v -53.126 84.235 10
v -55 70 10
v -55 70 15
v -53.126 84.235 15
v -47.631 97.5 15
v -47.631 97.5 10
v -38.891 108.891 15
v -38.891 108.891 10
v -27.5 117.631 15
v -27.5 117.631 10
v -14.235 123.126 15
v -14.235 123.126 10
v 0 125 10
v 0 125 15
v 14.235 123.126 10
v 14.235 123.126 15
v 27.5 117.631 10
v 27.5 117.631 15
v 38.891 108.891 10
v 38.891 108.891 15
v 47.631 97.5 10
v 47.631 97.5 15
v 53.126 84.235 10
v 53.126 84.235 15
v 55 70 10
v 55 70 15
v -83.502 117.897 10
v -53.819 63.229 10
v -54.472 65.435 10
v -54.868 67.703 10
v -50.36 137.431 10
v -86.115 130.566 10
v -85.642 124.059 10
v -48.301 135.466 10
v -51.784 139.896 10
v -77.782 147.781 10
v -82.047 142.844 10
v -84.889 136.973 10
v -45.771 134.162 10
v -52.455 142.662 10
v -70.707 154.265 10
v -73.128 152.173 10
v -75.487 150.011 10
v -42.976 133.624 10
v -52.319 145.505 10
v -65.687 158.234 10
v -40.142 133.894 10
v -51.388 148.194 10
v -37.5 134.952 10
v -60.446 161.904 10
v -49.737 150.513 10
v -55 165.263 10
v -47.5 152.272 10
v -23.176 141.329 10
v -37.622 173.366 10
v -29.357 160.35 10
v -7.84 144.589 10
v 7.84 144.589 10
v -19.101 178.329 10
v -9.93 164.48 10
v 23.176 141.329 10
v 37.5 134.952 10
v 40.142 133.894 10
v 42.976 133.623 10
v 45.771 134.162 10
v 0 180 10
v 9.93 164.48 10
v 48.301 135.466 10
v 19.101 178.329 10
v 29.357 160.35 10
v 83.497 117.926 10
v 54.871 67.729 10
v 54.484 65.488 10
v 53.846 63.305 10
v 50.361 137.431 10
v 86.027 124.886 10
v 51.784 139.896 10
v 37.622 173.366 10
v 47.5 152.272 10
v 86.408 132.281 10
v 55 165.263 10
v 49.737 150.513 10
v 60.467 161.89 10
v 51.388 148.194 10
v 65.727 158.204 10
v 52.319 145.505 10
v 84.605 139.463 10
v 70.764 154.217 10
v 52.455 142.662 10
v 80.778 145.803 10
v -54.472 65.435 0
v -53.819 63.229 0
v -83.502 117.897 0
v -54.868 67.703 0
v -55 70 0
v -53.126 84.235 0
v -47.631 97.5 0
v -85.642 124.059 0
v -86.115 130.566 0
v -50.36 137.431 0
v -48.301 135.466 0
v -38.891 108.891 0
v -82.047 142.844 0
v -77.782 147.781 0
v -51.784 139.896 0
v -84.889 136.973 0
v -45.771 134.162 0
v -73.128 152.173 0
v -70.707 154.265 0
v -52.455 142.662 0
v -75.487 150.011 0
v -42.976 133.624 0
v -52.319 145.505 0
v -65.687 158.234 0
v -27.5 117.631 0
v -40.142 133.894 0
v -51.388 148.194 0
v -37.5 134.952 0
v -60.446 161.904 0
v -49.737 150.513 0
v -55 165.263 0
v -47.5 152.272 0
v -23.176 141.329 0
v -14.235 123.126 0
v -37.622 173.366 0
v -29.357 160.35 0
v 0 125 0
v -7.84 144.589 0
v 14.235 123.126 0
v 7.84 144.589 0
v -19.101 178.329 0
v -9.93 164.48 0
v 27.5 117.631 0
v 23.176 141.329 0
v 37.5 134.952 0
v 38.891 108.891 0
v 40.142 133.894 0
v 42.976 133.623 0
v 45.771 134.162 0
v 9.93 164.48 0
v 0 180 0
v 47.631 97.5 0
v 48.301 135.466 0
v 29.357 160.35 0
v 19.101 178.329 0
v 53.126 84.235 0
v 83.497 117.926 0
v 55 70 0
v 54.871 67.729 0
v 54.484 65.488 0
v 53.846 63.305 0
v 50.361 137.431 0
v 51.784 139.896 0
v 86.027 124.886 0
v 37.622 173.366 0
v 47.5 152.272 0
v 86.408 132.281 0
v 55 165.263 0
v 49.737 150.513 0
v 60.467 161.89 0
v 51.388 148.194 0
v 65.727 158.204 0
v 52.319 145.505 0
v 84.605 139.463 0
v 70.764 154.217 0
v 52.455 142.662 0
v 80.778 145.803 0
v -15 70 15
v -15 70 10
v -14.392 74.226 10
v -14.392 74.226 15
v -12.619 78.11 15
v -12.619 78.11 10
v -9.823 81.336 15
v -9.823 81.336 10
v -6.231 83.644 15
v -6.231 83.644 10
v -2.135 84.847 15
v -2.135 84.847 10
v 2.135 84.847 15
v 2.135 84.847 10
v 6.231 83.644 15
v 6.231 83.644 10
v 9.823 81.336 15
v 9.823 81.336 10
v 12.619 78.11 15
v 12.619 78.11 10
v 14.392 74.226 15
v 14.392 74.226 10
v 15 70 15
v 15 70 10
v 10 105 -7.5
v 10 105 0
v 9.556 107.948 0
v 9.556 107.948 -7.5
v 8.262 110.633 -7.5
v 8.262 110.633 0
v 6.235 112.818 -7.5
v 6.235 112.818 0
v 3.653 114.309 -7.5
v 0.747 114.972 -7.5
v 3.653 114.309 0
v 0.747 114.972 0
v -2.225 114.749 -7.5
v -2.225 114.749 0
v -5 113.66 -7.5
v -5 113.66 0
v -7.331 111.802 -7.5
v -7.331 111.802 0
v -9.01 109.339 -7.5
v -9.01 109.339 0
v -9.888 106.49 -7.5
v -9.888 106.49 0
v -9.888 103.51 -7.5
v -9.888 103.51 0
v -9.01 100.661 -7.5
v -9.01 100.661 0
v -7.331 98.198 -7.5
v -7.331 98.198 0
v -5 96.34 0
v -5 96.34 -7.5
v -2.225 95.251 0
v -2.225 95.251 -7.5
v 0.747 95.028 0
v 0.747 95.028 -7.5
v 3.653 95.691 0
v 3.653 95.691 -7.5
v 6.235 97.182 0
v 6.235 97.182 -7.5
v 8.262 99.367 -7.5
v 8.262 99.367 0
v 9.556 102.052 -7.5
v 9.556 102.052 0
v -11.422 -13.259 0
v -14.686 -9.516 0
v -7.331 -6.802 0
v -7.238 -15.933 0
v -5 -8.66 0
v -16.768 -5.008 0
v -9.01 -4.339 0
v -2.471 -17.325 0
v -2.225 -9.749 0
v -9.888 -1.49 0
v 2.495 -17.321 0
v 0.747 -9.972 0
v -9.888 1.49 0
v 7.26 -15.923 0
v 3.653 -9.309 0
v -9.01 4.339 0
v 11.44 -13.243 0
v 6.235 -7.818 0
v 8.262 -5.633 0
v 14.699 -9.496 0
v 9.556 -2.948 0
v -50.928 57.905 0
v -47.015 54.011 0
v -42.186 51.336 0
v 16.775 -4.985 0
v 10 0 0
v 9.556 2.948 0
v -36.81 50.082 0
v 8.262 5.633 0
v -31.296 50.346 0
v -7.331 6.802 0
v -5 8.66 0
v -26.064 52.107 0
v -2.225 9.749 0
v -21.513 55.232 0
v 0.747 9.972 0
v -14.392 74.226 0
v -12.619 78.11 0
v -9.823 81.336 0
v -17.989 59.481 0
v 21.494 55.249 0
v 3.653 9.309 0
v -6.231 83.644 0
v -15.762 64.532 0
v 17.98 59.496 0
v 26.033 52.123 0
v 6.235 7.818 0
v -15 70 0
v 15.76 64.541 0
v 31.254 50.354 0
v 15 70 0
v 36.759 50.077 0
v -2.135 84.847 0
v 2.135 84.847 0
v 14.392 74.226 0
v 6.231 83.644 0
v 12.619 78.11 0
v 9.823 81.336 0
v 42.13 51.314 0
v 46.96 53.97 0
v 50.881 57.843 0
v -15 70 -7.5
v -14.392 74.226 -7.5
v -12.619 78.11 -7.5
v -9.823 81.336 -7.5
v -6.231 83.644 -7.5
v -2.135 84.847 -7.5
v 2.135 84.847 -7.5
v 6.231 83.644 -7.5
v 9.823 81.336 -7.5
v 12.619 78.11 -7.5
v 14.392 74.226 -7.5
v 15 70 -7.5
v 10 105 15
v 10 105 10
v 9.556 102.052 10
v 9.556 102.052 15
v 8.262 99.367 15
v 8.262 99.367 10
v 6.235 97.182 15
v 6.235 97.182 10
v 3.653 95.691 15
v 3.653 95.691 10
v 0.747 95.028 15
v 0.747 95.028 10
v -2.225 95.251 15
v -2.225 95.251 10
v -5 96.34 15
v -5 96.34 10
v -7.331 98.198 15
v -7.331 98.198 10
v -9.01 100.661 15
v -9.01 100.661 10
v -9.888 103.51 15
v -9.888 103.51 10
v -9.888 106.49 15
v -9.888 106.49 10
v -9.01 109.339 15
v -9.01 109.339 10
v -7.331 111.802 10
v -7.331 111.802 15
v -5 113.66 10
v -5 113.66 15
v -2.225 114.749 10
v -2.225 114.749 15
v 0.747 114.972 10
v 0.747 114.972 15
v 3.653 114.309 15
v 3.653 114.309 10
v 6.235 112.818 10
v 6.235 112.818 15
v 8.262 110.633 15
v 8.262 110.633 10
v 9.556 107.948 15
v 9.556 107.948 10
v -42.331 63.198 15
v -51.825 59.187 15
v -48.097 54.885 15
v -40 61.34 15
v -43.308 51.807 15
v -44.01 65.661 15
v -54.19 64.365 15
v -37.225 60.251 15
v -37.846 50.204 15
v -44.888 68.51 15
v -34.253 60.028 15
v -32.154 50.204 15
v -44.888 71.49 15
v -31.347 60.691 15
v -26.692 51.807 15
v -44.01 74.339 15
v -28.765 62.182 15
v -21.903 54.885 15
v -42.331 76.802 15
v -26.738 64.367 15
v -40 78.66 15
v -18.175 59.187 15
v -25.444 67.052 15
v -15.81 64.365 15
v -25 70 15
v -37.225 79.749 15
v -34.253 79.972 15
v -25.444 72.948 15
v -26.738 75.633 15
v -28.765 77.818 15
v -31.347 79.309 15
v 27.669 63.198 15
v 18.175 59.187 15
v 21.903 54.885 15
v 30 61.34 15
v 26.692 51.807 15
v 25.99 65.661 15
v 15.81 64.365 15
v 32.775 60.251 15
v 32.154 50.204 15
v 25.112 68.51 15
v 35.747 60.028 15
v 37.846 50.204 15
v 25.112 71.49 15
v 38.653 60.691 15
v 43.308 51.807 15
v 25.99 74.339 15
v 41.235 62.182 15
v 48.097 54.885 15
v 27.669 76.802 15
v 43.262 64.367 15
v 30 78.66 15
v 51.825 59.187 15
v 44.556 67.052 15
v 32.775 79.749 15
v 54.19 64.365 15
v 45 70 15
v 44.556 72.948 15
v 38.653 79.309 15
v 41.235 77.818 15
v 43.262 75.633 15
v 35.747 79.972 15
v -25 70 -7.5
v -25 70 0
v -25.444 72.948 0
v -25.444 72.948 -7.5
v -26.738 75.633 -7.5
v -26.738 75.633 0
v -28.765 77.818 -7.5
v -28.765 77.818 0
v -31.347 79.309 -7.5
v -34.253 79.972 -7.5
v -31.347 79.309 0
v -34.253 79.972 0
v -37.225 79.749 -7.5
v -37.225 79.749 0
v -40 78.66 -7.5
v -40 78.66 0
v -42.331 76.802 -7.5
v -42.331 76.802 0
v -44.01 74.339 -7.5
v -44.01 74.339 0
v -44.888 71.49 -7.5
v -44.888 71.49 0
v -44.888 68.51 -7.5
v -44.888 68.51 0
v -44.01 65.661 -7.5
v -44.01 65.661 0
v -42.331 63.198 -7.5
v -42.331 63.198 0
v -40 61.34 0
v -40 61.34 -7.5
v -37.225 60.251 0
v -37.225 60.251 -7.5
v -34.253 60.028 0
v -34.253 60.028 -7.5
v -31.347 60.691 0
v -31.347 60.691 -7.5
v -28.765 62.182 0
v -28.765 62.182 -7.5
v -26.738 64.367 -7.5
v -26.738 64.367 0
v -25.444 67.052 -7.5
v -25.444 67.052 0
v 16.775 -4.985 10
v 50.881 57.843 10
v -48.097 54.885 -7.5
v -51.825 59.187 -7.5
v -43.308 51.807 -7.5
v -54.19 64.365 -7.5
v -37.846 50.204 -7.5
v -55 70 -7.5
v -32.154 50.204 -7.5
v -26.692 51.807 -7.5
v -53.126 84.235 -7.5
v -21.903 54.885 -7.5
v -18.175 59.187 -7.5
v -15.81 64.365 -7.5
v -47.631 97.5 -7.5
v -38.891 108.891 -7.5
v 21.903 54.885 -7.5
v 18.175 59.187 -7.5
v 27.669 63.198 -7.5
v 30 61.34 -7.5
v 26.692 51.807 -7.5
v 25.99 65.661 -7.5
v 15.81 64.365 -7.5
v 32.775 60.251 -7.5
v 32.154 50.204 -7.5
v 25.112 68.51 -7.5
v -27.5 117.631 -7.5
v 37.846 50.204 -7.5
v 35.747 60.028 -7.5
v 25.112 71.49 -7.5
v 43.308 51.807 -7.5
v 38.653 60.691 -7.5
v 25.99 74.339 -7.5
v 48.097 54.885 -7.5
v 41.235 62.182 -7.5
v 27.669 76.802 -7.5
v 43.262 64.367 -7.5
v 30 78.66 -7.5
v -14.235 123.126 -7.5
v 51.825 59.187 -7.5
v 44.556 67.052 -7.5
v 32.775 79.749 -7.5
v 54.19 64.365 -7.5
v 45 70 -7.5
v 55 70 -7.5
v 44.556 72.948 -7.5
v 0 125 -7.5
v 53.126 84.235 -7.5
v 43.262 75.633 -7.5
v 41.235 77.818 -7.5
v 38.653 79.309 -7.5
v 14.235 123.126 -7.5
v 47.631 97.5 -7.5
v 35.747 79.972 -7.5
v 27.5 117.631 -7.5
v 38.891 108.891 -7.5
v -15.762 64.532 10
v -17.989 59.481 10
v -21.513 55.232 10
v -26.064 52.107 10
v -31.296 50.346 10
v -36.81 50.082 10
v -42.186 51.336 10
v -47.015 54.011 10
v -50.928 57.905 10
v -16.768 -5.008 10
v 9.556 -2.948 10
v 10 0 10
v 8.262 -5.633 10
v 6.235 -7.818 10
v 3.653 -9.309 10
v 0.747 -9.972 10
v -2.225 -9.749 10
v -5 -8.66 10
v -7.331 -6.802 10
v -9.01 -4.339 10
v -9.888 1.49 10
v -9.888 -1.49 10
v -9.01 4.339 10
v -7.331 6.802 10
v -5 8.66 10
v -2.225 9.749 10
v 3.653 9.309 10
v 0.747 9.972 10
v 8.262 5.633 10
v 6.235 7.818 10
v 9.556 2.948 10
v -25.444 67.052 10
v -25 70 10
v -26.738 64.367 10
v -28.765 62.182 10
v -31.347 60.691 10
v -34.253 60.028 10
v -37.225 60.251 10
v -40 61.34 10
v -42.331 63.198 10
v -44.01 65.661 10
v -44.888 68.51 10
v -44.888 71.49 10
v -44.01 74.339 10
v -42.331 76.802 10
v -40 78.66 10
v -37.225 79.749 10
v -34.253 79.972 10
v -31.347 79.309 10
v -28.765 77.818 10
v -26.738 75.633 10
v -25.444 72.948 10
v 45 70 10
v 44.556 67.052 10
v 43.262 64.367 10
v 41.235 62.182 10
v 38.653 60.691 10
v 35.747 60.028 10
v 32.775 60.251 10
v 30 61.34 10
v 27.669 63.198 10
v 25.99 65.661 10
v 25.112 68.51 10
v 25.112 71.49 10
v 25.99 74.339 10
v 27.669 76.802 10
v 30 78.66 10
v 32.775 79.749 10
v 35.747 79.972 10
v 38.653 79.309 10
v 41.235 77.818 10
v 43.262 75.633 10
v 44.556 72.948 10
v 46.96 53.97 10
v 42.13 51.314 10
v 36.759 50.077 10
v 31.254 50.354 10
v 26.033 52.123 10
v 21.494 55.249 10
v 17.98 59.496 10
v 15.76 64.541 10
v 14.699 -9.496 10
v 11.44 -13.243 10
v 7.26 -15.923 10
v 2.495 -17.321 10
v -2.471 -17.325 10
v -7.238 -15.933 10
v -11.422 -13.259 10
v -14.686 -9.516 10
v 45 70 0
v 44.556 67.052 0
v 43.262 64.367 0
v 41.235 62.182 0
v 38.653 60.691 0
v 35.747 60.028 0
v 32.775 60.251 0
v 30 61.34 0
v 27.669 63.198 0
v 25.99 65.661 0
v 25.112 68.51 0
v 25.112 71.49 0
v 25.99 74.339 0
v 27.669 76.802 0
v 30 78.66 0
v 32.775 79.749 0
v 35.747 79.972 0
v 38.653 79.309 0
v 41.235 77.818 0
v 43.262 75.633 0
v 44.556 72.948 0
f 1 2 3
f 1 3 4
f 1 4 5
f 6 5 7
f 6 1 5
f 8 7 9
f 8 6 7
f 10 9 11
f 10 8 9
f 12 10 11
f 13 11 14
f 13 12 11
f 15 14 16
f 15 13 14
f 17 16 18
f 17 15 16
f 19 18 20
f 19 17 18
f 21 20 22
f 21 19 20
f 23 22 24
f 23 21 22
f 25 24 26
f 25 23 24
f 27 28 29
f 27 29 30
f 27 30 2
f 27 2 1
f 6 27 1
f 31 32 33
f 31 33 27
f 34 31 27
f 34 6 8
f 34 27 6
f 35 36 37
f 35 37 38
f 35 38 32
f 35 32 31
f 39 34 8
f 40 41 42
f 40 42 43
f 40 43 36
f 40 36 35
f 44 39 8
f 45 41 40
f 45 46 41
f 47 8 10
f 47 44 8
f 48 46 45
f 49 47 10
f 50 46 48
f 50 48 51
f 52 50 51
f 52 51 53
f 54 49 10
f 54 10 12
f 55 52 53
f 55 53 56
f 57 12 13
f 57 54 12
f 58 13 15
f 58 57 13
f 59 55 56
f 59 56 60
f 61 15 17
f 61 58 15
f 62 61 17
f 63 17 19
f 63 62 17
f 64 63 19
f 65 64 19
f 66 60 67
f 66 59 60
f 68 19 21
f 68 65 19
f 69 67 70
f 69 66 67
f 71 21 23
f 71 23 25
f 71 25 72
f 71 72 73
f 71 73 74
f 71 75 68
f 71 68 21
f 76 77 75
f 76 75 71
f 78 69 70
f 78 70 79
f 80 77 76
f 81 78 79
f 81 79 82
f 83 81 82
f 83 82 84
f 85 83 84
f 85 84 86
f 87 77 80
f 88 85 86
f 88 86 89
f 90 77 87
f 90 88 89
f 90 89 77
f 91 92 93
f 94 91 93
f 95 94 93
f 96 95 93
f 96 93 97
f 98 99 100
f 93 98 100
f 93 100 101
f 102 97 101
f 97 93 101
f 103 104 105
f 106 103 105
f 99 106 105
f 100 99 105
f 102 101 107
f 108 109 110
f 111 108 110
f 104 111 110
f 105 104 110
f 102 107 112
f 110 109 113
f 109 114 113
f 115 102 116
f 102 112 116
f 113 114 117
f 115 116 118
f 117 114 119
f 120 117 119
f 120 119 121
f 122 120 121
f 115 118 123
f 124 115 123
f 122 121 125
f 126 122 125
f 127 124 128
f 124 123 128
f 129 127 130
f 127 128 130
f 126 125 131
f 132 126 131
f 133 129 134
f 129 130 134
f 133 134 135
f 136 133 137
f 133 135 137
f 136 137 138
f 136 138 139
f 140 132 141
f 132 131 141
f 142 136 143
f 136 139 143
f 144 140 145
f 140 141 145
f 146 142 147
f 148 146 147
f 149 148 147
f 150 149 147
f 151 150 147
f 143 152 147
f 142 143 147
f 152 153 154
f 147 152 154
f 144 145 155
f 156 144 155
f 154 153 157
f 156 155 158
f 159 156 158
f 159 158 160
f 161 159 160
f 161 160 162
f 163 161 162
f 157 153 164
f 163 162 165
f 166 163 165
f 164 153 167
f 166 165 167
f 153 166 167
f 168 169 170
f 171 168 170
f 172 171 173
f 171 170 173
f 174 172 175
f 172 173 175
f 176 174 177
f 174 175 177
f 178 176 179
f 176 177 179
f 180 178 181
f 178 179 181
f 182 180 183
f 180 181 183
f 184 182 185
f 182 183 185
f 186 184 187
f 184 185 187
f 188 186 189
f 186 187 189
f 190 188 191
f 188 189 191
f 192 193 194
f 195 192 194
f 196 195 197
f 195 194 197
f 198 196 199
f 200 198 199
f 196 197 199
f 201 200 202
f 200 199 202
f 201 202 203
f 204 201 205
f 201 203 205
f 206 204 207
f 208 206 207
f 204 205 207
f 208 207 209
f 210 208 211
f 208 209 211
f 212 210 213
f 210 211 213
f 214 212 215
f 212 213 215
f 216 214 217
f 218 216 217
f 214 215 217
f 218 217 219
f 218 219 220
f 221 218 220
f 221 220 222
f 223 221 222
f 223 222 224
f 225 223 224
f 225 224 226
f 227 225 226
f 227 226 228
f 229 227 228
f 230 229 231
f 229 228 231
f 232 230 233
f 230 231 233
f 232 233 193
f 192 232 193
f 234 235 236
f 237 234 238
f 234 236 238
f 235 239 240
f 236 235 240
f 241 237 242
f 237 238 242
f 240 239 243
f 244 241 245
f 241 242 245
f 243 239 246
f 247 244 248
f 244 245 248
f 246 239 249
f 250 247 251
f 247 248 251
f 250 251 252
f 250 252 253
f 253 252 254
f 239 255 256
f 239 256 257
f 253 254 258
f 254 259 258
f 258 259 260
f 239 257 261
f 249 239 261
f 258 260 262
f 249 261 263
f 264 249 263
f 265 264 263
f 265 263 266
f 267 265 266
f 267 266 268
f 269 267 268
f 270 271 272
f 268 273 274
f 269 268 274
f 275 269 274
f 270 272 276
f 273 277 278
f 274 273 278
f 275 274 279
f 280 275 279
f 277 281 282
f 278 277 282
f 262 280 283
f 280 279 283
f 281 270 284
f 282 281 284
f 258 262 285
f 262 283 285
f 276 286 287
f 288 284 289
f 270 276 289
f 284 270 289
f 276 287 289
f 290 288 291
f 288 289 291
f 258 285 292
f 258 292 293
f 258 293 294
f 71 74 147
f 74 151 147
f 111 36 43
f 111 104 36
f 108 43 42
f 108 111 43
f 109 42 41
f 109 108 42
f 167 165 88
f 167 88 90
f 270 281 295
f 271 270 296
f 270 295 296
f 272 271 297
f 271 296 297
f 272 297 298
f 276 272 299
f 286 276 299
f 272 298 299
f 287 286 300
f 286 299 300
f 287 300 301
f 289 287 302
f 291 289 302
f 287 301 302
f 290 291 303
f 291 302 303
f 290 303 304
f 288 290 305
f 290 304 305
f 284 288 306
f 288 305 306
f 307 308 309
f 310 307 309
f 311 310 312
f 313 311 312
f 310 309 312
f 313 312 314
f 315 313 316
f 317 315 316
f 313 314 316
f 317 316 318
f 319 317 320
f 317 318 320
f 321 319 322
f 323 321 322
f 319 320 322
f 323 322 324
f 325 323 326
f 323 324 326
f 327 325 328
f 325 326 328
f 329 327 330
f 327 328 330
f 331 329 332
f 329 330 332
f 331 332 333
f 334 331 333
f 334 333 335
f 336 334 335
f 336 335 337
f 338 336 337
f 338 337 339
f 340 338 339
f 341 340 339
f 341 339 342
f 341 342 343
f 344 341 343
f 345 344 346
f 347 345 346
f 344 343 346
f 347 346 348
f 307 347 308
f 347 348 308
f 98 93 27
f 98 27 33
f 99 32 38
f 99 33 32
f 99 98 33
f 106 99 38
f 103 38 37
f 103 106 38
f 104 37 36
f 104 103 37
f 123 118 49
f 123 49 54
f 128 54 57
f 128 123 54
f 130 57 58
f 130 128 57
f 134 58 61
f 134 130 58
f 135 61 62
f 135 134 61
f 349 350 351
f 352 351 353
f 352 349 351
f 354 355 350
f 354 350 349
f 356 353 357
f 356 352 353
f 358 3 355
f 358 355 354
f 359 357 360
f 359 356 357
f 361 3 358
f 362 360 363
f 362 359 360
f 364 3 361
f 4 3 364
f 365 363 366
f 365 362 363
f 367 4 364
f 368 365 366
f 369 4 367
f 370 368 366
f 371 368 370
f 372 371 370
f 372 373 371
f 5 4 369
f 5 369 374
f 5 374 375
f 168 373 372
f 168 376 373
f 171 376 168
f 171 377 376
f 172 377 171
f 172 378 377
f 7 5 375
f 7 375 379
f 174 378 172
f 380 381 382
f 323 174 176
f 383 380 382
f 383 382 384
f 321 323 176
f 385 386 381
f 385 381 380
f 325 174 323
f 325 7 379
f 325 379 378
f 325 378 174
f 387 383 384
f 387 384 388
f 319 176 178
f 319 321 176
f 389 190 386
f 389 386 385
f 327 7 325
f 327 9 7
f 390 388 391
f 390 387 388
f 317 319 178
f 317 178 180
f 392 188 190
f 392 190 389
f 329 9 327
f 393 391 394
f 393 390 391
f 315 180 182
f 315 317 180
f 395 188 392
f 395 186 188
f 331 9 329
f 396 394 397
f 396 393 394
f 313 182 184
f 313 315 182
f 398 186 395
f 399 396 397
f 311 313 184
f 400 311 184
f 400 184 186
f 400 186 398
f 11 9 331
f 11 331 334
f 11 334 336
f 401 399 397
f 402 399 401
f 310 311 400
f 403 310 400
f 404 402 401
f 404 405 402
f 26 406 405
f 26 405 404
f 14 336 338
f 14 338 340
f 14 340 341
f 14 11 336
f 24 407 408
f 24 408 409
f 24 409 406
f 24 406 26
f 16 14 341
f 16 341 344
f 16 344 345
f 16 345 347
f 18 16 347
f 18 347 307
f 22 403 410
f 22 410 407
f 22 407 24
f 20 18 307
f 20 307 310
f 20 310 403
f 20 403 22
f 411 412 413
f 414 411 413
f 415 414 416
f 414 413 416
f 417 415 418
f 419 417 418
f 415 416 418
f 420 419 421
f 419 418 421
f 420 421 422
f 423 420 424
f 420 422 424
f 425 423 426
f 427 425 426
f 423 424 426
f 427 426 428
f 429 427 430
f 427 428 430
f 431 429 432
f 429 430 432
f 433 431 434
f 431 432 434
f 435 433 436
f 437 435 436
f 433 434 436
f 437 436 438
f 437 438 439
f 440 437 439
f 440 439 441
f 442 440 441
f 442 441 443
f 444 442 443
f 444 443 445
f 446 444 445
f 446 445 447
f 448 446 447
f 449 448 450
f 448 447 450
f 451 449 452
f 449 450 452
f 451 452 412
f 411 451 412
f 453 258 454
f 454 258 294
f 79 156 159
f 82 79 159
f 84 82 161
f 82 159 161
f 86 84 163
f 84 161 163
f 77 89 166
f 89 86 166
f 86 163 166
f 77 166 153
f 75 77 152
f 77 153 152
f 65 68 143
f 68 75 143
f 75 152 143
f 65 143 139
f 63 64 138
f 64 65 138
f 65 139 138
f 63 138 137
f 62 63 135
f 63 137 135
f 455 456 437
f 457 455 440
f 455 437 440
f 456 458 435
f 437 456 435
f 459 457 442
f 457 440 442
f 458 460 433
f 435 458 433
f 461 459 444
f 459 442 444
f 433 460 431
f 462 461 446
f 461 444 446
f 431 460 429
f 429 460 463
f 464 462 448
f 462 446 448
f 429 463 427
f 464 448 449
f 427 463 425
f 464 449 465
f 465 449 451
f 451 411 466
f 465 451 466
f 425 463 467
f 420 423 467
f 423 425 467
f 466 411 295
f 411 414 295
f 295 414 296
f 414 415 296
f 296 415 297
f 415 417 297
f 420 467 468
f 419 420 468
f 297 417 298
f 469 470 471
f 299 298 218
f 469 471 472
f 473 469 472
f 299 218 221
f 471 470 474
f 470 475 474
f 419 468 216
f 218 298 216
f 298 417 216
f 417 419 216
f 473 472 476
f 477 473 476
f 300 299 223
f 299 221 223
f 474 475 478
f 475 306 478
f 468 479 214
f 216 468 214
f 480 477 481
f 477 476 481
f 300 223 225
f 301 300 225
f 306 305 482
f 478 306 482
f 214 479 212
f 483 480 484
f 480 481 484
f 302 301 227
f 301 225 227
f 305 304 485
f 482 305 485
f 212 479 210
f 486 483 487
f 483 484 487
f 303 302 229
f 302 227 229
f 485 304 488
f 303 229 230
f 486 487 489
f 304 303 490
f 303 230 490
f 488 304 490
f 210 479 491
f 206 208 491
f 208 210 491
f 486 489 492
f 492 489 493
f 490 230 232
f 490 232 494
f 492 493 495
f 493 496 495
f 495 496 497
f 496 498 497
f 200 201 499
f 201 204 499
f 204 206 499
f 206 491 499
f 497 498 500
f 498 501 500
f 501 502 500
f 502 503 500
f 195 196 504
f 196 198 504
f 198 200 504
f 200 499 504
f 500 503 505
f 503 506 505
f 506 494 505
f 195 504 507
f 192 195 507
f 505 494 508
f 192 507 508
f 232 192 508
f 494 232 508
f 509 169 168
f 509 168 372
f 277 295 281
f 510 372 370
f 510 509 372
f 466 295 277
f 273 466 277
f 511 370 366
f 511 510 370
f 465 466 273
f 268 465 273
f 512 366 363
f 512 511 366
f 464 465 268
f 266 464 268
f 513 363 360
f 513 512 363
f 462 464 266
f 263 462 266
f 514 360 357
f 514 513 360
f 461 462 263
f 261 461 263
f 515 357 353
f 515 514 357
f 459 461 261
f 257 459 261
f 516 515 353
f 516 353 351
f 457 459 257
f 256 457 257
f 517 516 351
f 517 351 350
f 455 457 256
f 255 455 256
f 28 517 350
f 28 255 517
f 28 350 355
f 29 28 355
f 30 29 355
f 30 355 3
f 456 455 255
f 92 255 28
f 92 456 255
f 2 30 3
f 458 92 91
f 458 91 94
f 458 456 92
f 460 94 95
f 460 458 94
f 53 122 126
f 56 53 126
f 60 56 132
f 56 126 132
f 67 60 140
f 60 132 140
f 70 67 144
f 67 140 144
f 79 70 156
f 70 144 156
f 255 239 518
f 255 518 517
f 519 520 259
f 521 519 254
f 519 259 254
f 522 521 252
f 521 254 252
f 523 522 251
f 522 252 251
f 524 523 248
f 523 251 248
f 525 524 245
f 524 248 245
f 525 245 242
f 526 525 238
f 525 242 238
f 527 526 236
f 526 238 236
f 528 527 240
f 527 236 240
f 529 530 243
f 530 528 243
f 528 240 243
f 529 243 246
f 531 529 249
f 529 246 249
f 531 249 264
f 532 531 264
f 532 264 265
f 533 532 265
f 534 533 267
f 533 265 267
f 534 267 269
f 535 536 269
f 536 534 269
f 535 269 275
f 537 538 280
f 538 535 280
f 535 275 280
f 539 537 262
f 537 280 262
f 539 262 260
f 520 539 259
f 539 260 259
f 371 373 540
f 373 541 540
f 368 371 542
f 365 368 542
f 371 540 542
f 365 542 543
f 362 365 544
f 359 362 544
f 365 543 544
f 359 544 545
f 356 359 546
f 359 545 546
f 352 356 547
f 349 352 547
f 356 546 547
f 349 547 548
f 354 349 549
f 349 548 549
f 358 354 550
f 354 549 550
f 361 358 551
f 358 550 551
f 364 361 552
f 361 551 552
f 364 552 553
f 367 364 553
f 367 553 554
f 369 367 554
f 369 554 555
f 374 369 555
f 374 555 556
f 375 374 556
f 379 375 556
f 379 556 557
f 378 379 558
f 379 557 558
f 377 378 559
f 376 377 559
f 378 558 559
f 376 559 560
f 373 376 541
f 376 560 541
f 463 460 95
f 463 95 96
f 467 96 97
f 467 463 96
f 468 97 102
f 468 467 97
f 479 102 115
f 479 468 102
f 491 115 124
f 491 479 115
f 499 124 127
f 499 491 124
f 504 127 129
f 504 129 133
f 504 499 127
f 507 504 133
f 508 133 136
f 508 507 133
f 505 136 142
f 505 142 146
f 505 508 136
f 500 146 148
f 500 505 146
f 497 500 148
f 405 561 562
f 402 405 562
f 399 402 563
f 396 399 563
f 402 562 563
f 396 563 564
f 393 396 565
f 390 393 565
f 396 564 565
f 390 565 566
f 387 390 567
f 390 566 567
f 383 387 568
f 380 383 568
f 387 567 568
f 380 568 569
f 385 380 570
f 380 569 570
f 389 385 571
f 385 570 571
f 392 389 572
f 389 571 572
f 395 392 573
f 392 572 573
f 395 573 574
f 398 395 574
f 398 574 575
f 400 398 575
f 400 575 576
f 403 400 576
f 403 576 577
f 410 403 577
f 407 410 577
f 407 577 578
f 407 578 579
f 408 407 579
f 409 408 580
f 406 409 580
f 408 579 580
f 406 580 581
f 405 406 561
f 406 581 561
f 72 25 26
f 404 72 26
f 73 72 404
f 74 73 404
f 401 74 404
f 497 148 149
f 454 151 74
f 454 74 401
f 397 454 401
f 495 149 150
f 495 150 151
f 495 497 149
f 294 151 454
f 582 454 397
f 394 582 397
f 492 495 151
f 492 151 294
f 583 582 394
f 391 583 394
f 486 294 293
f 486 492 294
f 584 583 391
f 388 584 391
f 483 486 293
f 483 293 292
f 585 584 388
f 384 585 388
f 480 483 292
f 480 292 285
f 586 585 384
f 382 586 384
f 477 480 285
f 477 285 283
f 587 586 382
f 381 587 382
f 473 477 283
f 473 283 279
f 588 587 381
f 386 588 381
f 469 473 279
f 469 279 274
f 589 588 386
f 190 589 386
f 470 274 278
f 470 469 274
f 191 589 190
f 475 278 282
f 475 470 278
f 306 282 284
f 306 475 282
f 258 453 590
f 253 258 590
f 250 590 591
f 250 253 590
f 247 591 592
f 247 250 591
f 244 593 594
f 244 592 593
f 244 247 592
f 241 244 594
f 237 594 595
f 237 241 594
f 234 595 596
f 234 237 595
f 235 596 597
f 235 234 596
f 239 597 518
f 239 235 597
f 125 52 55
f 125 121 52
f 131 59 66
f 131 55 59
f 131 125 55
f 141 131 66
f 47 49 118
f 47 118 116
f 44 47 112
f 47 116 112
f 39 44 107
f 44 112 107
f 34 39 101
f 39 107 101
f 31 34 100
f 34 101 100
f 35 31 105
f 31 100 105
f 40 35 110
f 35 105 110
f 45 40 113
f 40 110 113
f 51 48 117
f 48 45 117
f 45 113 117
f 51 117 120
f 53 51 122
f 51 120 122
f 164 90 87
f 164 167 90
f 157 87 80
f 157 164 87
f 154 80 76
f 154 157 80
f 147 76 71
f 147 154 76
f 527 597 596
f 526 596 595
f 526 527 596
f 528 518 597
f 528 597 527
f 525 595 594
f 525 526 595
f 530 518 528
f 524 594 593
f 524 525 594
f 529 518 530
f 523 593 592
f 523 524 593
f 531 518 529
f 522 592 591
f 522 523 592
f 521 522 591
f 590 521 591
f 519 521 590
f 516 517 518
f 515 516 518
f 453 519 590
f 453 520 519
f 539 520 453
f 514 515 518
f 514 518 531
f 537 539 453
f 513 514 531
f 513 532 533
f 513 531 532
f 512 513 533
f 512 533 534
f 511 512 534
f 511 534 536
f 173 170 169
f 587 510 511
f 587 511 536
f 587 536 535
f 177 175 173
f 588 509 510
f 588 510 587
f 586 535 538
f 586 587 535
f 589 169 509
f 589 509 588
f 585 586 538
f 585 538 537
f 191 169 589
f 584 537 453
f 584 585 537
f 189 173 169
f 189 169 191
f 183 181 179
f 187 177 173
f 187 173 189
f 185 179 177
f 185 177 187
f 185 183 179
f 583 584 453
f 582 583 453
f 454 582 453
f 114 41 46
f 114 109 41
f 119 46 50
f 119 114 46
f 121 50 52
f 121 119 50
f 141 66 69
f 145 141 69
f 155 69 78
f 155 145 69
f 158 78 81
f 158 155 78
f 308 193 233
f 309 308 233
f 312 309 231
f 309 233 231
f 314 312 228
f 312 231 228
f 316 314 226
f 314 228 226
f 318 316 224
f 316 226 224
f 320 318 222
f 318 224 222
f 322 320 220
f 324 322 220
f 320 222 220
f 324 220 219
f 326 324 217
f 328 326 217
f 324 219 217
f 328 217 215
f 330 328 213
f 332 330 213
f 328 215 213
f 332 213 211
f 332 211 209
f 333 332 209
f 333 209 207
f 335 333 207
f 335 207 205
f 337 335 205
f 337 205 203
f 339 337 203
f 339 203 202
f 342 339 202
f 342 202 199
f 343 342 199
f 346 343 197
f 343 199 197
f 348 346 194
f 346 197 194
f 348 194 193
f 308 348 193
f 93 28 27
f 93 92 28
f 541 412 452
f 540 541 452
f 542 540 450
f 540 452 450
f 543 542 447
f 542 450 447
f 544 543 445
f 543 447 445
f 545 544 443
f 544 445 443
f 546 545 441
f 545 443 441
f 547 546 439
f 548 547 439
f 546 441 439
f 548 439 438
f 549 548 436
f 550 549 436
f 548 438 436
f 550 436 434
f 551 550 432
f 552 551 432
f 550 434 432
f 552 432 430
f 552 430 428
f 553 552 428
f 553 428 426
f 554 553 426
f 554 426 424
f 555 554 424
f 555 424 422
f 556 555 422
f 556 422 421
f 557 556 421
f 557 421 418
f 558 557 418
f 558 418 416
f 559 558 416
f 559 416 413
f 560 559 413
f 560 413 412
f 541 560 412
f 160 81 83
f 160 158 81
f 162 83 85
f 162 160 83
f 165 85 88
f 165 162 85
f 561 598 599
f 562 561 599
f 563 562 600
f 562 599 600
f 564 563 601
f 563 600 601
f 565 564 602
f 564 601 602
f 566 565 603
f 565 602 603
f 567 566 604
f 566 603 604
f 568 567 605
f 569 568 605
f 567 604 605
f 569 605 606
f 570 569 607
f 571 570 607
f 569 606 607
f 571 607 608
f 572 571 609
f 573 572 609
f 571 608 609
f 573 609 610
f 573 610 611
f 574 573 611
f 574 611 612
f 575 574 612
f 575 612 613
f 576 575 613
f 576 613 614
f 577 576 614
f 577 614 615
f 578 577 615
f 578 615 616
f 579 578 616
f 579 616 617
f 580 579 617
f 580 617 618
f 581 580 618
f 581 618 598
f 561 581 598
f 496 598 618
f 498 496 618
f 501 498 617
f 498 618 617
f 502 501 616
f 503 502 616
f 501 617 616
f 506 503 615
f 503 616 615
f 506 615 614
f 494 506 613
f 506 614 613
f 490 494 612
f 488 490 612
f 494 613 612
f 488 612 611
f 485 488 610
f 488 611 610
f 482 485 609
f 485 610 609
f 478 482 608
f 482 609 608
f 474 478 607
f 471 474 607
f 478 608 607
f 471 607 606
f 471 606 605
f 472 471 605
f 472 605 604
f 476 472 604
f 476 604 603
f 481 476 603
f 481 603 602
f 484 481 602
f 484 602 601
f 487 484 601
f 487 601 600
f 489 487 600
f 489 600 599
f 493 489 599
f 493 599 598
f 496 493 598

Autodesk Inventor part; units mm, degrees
ref_plane "YZ Plane" through (0, 0, 0) normal (1, 0, 0) x (0, 1, 0)
ref_plane "XZ Plane" through (0, 0, 0) normal (0, 1, 0) x (-1, 0, 0)
ref_plane "XY Plane" through (0, 0, 0) normal (0, 0, 1) x (1, 0, 0)
sketch "Эскиз1" plane through (0, 0, 0) normal (0, 0, 1) x (1, 0, 0)
  circle A0 centre (0, 0) radius 17.5
  circle A1 centre (0, 0) radius 10
  line L0 (0, 0) -> (0, 70)
  arc A2 (35, 70) -> (-35, 70) centre (0, 70) ccw
  arc A3 (55, 70) -> (-55, 70) centre (0, 70) ccw
  arc A4 (15, 70) -> (-15, 70) centre (0, 70) ccw
  arc A5 (-55, 70) -> (-15, 70) centre (-35, 70) ccw
  arc A6 (15, 70) -> (55, 70) centre (35, 70) ccw
  circle A7 centre (-35, 70) radius 10
  circle A8 centre (0, 105) radius 10
  circle A9 centre (35, 70) radius 10
  line L1 (-35, 70) -> (-35, 50)
  line L2 (-35, 50) -> (-35, 44.4464)
  line L3 (35, 70) -> (35, 50)
  line L4 (35, 50) -> (35, 44.4464)
  arc A10 (55, 165.2628) -> (0, 180) centre (0, 70) ccw
  line L5 (0, 70) -> (55, 165.2628) construction
  line L6 (0, 70) -> (0, 180) construction
  arc A11 (0, 180) -> (-55, 165.2628) centre (0, 70) ccw
  line L7 (0, 70) -> (-55, 165.2628) construction
  line L8 (0, 70) -> (0, 180) construction
  arc A12 (42.5, 143.6122) -> (-42.5, 143.6122) centre (0, 70) ccw
  arc A13 (37.5, 134.9519) -> (47.5, 152.2724) centre (42.5, 143.6122) ccw
  arc A14 (-47.5, 152.2724) -> (-37.5, 134.9519) centre (-42.5, 143.6122) ccw
  arc A15 (47.5, 152.2724) -> (-47.5, 152.2724) centre (0, 70) ccw
  arc A16 (37.5, 134.9519) -> (-37.5, 134.9519) centre (0, 70) ccw
  line L9 (0, 0) -> (-17.5, 0)
  line L10 (0, 0) -> (17.5, 0)
  line L11 (0, 0) -> (-10, 0)
  line L12 (0, 0) -> (10, 0)
  line L13 (0, 70) -> (0, 180)
  arc A17 (-55, 165.2628) -> (-70.7066, 154.2649) centre (0, 70) ccw
  line L14 (0, 70) -> (-55, 165.2628) construction
  line L15 (0, 70) -> (55, 165.2628)
  arc A18 (70.764, 154.2167) -> (55, 165.2628) centre (0, 70) ccw
  line L16 (-16.7681, -5.0081) -> (-83.5023, 117.8971)
  arc A19 (-70.7066, 154.2649) -> (-77.7825, 147.781) centre (0, 70) ccw
  arc A20 (-77.7825, 147.781) -> (-83.5023, 117.8971) centre (-61.1578, 129.1097) ccw
  line L17 (16.7749, -4.9852) -> (83.4973, 117.9265)
  line L18 (70.764, 154.2167) -> (80.7777, 145.8026)
  arc A21 (83.4973, 117.9265) -> (80.7777, 145.8026) centre (61.5259, 129.8537) ccw
  dimension "d15" = 70
  dimension "d17" = 105
  dimension "d19" = 30
  dimension "d20" = 30
  dimension "d23" = 10
  dimension "d28" = 35
  dimension "d29" = 20
  dimension "d30" = 20
  dimension "d31" = 15
  dimension "d32" = 35
  dimension "d33" = 85
  dimension "d34" = 110
  dimension "d35" = 55
  dimension "d55" = 25
  dimension "d110" = 19.5925
  dimension "d111" = 107.0482
  dimension "d112" = 152.0798
  dimension "d113" = 104.0886
  dimension "d114" = 90.9725
  dimension "d115" = 101.544
  dimension "d116" = 49.961
  dimension "d117" = 21.46
  dimension "d119" = 17.1211
  dimension "d120" = 17.1257
extrude "Выдавливание1" add sketch "Эскиз1" along normal blind 10 contours L9 A1 L10 A0 | A0 L16 A5 A4 L13 L0 | A0 L0 A1 L9 | L0 L15 A4 A6 L17 A0 | A0 L10 A1 L0 | L16 A5 A3 L13 A8 A2 A7 L1 | L13 A4 L15 | A6 L3 A9 A2 L15 A3 L17 | L16 A20 A19 A17 A11 L13 A15 A14 A16 A3 A5 | L1 A7 A2 A8 L13 A4 A5 | L13 A8 A2 L15 A4 | L15 A2 A9 L3 A6 A4 | A6 A3 L15 A13 A18 L18 A21 L17 | A2 A8 L13 A3 L15 | L13 A16 L15 A3 | A15 L13 A10 L15
extrude "Выдавливание2" add sketch "Эскиз1" along normal blind 15 and the other way blind 7.5 contours L16 A5 A3 L13 A8 A2 A7 L1 | A5 L16 | L17 A6 | A6 L3 A9 A2 L15 A3 L17 | L1 A7 A2 A8 L13 A4 A5 | L13 A8 A2 L15 A4 | L15 A2 A9 L3 A6 A4 | A2 A8 L13 A3 L15
properties part number "lab2_1_2"
